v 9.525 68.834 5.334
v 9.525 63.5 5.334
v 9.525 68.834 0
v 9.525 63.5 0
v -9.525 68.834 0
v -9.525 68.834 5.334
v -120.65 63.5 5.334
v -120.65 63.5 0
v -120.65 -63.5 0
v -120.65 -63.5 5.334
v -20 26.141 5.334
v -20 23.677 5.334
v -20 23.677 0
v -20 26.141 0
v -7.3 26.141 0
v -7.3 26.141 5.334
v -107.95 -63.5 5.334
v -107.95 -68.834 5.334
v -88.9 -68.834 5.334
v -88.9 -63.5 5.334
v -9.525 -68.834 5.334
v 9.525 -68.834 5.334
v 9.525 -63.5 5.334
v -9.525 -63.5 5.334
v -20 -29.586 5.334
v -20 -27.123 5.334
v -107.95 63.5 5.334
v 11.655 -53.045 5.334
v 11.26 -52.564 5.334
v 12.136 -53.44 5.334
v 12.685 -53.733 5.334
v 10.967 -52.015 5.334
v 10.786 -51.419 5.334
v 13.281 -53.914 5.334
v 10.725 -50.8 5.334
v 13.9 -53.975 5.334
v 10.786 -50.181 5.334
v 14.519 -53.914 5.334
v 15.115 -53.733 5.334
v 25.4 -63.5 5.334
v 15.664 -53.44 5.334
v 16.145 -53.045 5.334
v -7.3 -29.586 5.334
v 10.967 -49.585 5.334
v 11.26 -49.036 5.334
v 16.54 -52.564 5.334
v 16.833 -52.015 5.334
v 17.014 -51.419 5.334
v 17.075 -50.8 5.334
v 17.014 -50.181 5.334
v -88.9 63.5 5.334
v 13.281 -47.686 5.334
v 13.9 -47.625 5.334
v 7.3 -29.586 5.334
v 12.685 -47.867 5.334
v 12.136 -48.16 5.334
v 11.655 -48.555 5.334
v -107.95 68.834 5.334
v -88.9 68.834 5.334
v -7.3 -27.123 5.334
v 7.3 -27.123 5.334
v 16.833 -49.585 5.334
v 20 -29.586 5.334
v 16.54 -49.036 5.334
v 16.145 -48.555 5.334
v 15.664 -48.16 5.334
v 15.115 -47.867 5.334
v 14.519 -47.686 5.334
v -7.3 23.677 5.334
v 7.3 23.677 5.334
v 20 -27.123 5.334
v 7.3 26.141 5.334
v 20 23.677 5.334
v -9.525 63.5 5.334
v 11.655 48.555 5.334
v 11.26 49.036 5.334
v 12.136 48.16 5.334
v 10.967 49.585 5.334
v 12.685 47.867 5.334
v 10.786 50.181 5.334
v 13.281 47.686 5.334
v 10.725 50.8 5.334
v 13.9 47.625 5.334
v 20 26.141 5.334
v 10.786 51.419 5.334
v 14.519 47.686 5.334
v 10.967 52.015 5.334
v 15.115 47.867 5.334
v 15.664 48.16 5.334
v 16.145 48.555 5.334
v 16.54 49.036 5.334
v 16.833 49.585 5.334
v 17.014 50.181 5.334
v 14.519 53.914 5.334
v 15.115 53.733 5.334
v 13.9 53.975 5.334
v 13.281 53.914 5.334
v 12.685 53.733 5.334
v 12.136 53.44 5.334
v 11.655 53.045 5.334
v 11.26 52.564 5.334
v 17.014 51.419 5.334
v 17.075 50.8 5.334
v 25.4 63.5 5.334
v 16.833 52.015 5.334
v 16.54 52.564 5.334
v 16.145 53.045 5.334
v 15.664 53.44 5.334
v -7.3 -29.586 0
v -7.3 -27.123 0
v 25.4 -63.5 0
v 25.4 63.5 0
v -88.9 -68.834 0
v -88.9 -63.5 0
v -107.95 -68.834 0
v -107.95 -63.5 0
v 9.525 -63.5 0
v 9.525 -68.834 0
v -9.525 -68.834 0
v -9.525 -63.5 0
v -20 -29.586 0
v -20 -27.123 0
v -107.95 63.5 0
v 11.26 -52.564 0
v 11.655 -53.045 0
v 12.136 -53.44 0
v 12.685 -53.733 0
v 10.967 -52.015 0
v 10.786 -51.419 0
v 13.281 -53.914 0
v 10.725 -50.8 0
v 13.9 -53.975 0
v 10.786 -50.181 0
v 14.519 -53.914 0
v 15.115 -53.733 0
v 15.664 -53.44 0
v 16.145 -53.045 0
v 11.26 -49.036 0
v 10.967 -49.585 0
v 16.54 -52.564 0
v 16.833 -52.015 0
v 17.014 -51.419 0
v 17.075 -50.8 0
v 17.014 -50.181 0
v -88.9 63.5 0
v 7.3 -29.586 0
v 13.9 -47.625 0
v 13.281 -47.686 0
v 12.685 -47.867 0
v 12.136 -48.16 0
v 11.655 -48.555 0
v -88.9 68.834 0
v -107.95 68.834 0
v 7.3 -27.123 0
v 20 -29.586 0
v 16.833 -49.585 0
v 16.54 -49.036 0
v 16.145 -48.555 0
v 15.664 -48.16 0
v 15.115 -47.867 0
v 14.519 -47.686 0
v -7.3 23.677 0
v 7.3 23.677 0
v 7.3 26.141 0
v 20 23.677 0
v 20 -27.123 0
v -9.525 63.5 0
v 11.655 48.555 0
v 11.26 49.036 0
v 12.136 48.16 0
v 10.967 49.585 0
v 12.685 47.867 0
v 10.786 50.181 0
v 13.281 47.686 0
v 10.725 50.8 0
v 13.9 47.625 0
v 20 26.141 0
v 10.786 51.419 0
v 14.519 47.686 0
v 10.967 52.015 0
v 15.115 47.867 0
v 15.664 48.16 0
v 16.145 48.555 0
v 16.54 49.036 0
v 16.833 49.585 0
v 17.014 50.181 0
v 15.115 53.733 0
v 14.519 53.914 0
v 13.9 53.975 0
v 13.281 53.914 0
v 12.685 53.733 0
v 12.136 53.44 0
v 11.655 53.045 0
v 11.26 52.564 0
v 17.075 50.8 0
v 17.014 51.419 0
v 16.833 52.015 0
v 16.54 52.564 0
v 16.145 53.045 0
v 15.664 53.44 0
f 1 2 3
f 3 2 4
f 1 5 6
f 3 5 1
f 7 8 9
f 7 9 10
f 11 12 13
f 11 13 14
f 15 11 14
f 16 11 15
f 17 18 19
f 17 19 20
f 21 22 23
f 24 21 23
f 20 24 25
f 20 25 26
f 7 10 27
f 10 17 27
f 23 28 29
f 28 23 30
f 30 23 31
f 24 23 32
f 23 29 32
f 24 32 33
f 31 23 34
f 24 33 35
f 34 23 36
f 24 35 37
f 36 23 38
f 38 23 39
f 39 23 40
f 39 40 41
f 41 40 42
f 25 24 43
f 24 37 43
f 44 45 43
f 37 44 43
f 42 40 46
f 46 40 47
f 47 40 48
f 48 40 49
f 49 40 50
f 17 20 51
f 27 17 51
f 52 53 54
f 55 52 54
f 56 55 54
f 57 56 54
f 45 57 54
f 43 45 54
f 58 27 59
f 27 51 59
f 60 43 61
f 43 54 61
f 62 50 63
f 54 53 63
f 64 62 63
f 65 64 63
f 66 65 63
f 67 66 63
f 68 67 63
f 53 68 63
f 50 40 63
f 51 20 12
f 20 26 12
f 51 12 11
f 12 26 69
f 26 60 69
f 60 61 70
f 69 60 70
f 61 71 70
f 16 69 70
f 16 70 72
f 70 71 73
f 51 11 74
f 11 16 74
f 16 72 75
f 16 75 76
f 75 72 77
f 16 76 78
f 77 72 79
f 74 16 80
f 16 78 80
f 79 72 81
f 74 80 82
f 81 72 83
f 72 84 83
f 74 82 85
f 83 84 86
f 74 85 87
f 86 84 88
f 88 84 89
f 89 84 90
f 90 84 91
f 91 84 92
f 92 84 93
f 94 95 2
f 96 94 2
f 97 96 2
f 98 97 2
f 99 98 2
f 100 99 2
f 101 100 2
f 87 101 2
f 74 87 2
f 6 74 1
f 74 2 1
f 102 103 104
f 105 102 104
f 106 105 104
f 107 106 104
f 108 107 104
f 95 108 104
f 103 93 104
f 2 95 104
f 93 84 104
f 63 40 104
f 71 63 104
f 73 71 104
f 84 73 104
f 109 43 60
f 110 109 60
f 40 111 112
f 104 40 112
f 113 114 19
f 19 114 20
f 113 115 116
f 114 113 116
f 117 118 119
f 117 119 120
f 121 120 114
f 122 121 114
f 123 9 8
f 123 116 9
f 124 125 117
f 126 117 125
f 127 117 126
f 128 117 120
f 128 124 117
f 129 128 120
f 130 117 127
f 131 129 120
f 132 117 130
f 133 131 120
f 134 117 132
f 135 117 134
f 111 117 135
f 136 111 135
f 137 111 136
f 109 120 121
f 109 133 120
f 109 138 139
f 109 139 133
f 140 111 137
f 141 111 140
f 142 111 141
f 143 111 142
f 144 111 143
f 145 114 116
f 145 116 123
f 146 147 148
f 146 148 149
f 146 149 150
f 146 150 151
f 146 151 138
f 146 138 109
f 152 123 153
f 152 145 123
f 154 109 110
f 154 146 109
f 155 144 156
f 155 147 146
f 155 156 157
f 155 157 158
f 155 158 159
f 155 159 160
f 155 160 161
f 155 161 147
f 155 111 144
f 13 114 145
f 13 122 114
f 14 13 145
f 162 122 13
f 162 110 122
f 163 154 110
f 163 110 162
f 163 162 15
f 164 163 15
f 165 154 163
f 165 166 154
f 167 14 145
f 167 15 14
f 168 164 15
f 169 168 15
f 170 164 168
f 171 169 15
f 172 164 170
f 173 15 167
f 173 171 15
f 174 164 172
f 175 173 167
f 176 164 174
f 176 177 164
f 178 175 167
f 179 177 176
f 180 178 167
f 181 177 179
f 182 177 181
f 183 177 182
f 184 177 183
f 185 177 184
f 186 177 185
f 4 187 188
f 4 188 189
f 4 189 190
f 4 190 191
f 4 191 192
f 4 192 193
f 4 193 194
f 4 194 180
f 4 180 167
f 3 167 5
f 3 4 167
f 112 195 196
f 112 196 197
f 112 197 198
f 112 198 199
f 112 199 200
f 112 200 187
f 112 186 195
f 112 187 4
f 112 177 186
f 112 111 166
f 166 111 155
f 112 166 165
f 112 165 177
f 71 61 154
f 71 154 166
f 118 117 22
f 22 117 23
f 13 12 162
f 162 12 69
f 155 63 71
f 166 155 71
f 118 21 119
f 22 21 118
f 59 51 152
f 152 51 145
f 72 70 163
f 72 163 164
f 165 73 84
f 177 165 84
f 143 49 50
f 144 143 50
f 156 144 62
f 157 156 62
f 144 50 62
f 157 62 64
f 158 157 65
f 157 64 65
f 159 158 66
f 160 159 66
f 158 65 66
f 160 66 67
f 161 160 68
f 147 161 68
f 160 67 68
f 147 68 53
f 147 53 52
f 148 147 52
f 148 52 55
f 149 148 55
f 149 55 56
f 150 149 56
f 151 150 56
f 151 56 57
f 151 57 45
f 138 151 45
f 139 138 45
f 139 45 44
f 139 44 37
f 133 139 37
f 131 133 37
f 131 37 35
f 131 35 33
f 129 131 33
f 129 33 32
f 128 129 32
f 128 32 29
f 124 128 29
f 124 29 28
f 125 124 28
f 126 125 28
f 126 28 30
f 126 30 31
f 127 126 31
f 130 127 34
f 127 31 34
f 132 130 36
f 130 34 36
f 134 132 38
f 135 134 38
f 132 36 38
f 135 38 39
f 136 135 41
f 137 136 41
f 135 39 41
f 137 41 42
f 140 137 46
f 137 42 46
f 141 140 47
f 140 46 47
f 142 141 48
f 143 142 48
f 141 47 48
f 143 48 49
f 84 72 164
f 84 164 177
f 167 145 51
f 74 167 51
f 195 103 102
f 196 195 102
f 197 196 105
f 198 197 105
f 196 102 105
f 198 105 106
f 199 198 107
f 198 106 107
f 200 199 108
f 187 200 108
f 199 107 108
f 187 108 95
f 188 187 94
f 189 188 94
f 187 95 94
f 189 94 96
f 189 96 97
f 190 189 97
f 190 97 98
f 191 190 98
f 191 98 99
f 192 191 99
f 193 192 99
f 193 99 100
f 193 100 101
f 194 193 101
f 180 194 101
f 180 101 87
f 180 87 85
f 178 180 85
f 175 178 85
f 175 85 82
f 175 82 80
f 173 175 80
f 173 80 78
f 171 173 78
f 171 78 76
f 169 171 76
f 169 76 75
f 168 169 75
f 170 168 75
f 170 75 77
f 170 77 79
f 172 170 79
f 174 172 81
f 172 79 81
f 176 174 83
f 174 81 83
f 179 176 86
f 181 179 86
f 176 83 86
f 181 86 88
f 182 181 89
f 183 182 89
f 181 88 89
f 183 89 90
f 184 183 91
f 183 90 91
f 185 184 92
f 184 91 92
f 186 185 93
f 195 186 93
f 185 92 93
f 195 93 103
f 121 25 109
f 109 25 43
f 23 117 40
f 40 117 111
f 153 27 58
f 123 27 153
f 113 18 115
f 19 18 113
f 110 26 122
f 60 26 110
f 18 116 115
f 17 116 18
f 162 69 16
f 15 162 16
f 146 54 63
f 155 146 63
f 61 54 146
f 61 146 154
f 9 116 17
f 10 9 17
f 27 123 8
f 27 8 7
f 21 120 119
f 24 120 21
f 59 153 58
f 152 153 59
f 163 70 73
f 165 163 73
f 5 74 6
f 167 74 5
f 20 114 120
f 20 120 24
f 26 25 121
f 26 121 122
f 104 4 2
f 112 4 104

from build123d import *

# Parameters (mm, degrees)
SKETCH1_W          = 50.8
SKETCH1_H          = 127
BODY_DEPTH         = 5.334
SKETCH3_W          = 19.05
SKETCH3_H          = 5.334
TOP_TAB_DEPTH      = 5.334
SKETCH4_W          = 19.05
SKETCH4_H          = 5.334
BOT_TAB_DEPTH      = 5.334
SKETCH5_W          = 12.7
SKETCH5_H          = 2.4638
MIDDLE_CUTS_DEPTH  = 74.564469087
SKETCH6_R          = 3.175
BOLTHOLES_DEPTH    = 74.564469087
SKETCH8_W          = 5.334
SKETCH8_H          = 127
PIC_PLATFORM_DEPTH = 95.25
SKETCH10_W         = 19.05
SKETCH10_H         = 5.334
LEFTEXTRUDE_DEPTH  = 5.334
SKETCH11_W         = 19.05
SKETCH11_H         = 5.334
RIGHTEXTRUDE_DEPTH = 5.334


with BuildPart() as part:
    # Sketch1 → body (new body)
    with BuildSketch(Plane.XY):
        Rectangle(SKETCH1_W, SKETCH1_H)
    extrude(amount=BODY_DEPTH)

    # Sketch3 → Top tab (add)
    with BuildSketch(Plane(origin=(0, 63.5, 0), x_dir=(1, 0, 0), z_dir=(0, 1, 0))):
        with Locations((0, -2.667)):
            Rectangle(SKETCH3_W, SKETCH3_H)
    extrude(amount=TOP_TAB_DEPTH)

    # Sketch4 → Bot tab (add)
    with BuildSketch(Plane.XZ.offset(63.5)):
        with Locations((0, 2.667)):
            Rectangle(SKETCH4_W, SKETCH4_H)
    extrude(amount=BOT_TAB_DEPTH)

    # Sketch5 → middle cuts (cut, through all)
    with BuildSketch(Plane.XY.offset(5.334)):
        with Locations((-13.649999878, 24.909253458)):
            Rectangle(SKETCH5_W, SKETCH5_H)
        with Locations((13.649999878, -28.354546542)):
            Rectangle(SKETCH5_W, SKETCH5_H)
        with Locations((-13.649999878, -28.354546542)):
            Rectangle(SKETCH5_W, SKETCH5_H)
        with Locations((13.649999878, 24.909253458)):
            Rectangle(SKETCH5_W, SKETCH5_H)
    extrude(amount=-MIDDLE_CUTS_DEPTH, mode=Mode.SUBTRACT)

    # Sketch6 → BoltHoles (cut, through all)
    with BuildSketch(Plane.XY.offset(5.334)):
        with Locations((13.900024524, 50.8)):
            Circle(SKETCH6_R)
        with Locations((13.900024524, -50.8)):
            Circle(SKETCH6_R)
    extrude(amount=-BOLTHOLES_DEPTH, mode=Mode.SUBTRACT)

    # Sketch8 → PIC platform (add)
    with BuildSketch(Plane.ZY.offset(25.4)):
        with Locations((2.667, 0)):
            Rectangle(SKETCH8_W, SKETCH8_H)
    extrude(amount=PIC_PLATFORM_DEPTH)

    # Sketch10 → LeftExtrude (add)
    with BuildSketch(Plane(origin=(0, 63.5, 0), x_dir=(1, 0, 0), z_dir=(0, 1, 0))):
        with Locations((-98.425, -2.667)):
            Rectangle(SKETCH10_W, SKETCH10_H)
    extrude(amount=LEFTEXTRUDE_DEPTH)

    # Sketch11 → RightExtrude (add)
    with BuildSketch(Plane.XZ.offset(63.5)):
        with Locations((-98.425, 2.667)):
            Rectangle(SKETCH11_W, SKETCH11_H)
    extrude(amount=RIGHTEXTRUDE_DEPTH)


solid = part.part
